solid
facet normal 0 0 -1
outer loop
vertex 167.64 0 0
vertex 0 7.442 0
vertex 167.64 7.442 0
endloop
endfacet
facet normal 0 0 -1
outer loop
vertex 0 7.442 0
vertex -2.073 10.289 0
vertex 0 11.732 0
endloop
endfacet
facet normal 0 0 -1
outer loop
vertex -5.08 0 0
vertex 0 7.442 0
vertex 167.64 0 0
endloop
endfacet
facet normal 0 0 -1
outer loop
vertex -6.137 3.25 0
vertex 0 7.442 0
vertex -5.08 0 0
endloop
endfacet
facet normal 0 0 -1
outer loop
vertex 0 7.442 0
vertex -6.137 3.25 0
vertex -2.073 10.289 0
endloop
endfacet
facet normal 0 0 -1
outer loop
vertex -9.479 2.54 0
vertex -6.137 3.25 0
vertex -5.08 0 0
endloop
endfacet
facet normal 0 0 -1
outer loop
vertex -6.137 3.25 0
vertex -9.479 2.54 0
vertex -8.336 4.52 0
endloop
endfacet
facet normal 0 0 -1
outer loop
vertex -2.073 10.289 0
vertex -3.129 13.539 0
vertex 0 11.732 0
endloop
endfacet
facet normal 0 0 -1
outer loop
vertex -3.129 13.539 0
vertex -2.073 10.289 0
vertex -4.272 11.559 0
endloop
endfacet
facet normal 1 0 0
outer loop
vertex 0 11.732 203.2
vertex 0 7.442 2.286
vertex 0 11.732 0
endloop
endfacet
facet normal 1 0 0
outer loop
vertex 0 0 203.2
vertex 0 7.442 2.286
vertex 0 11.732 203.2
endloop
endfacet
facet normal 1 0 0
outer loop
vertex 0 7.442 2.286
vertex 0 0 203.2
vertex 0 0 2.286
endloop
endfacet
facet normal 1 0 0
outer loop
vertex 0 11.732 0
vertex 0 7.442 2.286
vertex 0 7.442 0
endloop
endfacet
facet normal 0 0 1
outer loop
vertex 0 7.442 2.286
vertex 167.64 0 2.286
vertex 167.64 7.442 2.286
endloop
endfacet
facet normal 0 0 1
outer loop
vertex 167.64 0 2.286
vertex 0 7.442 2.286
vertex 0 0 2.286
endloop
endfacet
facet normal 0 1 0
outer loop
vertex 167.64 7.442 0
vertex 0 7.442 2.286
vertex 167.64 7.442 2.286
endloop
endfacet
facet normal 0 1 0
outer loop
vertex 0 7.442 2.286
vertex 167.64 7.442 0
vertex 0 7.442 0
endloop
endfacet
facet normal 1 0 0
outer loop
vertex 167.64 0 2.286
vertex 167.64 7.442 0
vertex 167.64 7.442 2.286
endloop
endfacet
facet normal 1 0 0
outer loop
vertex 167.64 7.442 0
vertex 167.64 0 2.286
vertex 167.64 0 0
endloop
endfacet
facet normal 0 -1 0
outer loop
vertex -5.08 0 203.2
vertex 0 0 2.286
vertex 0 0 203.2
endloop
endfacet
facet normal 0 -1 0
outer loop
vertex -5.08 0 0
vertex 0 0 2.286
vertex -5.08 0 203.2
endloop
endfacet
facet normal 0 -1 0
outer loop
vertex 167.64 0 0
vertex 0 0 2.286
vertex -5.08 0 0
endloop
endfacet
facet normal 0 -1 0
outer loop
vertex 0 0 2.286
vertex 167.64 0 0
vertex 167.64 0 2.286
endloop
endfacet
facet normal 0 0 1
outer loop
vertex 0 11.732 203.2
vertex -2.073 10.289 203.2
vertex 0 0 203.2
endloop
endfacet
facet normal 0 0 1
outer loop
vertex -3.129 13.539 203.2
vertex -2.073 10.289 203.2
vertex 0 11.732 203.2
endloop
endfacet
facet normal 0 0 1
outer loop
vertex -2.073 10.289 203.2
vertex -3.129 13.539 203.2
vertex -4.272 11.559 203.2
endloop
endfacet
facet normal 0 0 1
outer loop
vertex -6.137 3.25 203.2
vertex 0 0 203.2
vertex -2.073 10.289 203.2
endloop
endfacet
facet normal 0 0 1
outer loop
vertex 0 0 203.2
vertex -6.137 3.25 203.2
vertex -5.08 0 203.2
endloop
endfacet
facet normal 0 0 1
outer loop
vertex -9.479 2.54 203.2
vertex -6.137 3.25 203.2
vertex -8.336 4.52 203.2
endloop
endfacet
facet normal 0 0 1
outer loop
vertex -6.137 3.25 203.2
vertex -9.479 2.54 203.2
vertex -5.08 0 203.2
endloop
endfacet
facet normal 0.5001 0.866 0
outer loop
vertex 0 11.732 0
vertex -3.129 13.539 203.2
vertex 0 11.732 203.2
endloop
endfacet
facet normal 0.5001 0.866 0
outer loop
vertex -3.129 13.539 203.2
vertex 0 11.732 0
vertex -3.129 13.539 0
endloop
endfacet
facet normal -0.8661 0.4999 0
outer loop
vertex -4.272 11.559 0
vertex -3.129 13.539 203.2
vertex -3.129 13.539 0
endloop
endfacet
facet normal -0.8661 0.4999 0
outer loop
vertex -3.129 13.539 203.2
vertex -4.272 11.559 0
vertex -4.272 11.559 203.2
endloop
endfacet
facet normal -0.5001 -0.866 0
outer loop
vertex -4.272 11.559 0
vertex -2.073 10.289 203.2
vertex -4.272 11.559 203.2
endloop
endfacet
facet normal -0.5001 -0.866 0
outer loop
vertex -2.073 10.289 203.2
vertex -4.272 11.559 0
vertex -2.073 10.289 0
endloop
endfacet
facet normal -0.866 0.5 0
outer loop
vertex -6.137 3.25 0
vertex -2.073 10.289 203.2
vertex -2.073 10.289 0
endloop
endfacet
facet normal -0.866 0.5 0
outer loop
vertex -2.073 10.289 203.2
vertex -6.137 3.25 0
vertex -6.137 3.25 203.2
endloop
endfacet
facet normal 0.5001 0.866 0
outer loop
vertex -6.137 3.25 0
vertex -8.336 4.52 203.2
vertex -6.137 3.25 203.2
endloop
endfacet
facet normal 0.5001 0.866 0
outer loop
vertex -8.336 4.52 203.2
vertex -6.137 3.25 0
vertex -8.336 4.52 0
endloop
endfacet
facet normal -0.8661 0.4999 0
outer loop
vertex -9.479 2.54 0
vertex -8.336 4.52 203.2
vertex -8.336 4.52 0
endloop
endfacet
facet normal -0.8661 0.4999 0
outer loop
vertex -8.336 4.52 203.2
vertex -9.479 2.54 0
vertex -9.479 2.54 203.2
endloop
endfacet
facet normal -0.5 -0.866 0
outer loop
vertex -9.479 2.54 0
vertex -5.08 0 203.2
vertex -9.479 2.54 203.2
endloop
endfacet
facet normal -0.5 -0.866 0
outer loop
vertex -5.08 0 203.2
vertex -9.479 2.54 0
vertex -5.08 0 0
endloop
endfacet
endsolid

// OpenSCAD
ViewScale = [0.0254, 0.0254, 0.0254];

model=1;

module model_ledstrip(numleds)
{
    linear_extrude(90)
    square([660*numleds, 293]);
}

module switchbox()
{
}

module onemount()
{
    linear_extrude(8000) {
    polygon(points=[[0, 0],[450,0],[0,200]]);
    intersection() {
        square([600, 400]);
        translate([0, 200, 0])
        rotate([0, 0, -30])
        difference()
        {
            square([500, 200]);
            translate([90, 100, 0])
            square([320, 200]);
        }
    }
    }

}

module forViewing()
{
    if (model)
    {
        color("cornflowerblue")
        model_ledstrip(10);
    }
    rotate([0, 0, 90])
    onemount();
}

module forPrinting()
{
}

scale(ViewScale)
{
    forViewing();
}
